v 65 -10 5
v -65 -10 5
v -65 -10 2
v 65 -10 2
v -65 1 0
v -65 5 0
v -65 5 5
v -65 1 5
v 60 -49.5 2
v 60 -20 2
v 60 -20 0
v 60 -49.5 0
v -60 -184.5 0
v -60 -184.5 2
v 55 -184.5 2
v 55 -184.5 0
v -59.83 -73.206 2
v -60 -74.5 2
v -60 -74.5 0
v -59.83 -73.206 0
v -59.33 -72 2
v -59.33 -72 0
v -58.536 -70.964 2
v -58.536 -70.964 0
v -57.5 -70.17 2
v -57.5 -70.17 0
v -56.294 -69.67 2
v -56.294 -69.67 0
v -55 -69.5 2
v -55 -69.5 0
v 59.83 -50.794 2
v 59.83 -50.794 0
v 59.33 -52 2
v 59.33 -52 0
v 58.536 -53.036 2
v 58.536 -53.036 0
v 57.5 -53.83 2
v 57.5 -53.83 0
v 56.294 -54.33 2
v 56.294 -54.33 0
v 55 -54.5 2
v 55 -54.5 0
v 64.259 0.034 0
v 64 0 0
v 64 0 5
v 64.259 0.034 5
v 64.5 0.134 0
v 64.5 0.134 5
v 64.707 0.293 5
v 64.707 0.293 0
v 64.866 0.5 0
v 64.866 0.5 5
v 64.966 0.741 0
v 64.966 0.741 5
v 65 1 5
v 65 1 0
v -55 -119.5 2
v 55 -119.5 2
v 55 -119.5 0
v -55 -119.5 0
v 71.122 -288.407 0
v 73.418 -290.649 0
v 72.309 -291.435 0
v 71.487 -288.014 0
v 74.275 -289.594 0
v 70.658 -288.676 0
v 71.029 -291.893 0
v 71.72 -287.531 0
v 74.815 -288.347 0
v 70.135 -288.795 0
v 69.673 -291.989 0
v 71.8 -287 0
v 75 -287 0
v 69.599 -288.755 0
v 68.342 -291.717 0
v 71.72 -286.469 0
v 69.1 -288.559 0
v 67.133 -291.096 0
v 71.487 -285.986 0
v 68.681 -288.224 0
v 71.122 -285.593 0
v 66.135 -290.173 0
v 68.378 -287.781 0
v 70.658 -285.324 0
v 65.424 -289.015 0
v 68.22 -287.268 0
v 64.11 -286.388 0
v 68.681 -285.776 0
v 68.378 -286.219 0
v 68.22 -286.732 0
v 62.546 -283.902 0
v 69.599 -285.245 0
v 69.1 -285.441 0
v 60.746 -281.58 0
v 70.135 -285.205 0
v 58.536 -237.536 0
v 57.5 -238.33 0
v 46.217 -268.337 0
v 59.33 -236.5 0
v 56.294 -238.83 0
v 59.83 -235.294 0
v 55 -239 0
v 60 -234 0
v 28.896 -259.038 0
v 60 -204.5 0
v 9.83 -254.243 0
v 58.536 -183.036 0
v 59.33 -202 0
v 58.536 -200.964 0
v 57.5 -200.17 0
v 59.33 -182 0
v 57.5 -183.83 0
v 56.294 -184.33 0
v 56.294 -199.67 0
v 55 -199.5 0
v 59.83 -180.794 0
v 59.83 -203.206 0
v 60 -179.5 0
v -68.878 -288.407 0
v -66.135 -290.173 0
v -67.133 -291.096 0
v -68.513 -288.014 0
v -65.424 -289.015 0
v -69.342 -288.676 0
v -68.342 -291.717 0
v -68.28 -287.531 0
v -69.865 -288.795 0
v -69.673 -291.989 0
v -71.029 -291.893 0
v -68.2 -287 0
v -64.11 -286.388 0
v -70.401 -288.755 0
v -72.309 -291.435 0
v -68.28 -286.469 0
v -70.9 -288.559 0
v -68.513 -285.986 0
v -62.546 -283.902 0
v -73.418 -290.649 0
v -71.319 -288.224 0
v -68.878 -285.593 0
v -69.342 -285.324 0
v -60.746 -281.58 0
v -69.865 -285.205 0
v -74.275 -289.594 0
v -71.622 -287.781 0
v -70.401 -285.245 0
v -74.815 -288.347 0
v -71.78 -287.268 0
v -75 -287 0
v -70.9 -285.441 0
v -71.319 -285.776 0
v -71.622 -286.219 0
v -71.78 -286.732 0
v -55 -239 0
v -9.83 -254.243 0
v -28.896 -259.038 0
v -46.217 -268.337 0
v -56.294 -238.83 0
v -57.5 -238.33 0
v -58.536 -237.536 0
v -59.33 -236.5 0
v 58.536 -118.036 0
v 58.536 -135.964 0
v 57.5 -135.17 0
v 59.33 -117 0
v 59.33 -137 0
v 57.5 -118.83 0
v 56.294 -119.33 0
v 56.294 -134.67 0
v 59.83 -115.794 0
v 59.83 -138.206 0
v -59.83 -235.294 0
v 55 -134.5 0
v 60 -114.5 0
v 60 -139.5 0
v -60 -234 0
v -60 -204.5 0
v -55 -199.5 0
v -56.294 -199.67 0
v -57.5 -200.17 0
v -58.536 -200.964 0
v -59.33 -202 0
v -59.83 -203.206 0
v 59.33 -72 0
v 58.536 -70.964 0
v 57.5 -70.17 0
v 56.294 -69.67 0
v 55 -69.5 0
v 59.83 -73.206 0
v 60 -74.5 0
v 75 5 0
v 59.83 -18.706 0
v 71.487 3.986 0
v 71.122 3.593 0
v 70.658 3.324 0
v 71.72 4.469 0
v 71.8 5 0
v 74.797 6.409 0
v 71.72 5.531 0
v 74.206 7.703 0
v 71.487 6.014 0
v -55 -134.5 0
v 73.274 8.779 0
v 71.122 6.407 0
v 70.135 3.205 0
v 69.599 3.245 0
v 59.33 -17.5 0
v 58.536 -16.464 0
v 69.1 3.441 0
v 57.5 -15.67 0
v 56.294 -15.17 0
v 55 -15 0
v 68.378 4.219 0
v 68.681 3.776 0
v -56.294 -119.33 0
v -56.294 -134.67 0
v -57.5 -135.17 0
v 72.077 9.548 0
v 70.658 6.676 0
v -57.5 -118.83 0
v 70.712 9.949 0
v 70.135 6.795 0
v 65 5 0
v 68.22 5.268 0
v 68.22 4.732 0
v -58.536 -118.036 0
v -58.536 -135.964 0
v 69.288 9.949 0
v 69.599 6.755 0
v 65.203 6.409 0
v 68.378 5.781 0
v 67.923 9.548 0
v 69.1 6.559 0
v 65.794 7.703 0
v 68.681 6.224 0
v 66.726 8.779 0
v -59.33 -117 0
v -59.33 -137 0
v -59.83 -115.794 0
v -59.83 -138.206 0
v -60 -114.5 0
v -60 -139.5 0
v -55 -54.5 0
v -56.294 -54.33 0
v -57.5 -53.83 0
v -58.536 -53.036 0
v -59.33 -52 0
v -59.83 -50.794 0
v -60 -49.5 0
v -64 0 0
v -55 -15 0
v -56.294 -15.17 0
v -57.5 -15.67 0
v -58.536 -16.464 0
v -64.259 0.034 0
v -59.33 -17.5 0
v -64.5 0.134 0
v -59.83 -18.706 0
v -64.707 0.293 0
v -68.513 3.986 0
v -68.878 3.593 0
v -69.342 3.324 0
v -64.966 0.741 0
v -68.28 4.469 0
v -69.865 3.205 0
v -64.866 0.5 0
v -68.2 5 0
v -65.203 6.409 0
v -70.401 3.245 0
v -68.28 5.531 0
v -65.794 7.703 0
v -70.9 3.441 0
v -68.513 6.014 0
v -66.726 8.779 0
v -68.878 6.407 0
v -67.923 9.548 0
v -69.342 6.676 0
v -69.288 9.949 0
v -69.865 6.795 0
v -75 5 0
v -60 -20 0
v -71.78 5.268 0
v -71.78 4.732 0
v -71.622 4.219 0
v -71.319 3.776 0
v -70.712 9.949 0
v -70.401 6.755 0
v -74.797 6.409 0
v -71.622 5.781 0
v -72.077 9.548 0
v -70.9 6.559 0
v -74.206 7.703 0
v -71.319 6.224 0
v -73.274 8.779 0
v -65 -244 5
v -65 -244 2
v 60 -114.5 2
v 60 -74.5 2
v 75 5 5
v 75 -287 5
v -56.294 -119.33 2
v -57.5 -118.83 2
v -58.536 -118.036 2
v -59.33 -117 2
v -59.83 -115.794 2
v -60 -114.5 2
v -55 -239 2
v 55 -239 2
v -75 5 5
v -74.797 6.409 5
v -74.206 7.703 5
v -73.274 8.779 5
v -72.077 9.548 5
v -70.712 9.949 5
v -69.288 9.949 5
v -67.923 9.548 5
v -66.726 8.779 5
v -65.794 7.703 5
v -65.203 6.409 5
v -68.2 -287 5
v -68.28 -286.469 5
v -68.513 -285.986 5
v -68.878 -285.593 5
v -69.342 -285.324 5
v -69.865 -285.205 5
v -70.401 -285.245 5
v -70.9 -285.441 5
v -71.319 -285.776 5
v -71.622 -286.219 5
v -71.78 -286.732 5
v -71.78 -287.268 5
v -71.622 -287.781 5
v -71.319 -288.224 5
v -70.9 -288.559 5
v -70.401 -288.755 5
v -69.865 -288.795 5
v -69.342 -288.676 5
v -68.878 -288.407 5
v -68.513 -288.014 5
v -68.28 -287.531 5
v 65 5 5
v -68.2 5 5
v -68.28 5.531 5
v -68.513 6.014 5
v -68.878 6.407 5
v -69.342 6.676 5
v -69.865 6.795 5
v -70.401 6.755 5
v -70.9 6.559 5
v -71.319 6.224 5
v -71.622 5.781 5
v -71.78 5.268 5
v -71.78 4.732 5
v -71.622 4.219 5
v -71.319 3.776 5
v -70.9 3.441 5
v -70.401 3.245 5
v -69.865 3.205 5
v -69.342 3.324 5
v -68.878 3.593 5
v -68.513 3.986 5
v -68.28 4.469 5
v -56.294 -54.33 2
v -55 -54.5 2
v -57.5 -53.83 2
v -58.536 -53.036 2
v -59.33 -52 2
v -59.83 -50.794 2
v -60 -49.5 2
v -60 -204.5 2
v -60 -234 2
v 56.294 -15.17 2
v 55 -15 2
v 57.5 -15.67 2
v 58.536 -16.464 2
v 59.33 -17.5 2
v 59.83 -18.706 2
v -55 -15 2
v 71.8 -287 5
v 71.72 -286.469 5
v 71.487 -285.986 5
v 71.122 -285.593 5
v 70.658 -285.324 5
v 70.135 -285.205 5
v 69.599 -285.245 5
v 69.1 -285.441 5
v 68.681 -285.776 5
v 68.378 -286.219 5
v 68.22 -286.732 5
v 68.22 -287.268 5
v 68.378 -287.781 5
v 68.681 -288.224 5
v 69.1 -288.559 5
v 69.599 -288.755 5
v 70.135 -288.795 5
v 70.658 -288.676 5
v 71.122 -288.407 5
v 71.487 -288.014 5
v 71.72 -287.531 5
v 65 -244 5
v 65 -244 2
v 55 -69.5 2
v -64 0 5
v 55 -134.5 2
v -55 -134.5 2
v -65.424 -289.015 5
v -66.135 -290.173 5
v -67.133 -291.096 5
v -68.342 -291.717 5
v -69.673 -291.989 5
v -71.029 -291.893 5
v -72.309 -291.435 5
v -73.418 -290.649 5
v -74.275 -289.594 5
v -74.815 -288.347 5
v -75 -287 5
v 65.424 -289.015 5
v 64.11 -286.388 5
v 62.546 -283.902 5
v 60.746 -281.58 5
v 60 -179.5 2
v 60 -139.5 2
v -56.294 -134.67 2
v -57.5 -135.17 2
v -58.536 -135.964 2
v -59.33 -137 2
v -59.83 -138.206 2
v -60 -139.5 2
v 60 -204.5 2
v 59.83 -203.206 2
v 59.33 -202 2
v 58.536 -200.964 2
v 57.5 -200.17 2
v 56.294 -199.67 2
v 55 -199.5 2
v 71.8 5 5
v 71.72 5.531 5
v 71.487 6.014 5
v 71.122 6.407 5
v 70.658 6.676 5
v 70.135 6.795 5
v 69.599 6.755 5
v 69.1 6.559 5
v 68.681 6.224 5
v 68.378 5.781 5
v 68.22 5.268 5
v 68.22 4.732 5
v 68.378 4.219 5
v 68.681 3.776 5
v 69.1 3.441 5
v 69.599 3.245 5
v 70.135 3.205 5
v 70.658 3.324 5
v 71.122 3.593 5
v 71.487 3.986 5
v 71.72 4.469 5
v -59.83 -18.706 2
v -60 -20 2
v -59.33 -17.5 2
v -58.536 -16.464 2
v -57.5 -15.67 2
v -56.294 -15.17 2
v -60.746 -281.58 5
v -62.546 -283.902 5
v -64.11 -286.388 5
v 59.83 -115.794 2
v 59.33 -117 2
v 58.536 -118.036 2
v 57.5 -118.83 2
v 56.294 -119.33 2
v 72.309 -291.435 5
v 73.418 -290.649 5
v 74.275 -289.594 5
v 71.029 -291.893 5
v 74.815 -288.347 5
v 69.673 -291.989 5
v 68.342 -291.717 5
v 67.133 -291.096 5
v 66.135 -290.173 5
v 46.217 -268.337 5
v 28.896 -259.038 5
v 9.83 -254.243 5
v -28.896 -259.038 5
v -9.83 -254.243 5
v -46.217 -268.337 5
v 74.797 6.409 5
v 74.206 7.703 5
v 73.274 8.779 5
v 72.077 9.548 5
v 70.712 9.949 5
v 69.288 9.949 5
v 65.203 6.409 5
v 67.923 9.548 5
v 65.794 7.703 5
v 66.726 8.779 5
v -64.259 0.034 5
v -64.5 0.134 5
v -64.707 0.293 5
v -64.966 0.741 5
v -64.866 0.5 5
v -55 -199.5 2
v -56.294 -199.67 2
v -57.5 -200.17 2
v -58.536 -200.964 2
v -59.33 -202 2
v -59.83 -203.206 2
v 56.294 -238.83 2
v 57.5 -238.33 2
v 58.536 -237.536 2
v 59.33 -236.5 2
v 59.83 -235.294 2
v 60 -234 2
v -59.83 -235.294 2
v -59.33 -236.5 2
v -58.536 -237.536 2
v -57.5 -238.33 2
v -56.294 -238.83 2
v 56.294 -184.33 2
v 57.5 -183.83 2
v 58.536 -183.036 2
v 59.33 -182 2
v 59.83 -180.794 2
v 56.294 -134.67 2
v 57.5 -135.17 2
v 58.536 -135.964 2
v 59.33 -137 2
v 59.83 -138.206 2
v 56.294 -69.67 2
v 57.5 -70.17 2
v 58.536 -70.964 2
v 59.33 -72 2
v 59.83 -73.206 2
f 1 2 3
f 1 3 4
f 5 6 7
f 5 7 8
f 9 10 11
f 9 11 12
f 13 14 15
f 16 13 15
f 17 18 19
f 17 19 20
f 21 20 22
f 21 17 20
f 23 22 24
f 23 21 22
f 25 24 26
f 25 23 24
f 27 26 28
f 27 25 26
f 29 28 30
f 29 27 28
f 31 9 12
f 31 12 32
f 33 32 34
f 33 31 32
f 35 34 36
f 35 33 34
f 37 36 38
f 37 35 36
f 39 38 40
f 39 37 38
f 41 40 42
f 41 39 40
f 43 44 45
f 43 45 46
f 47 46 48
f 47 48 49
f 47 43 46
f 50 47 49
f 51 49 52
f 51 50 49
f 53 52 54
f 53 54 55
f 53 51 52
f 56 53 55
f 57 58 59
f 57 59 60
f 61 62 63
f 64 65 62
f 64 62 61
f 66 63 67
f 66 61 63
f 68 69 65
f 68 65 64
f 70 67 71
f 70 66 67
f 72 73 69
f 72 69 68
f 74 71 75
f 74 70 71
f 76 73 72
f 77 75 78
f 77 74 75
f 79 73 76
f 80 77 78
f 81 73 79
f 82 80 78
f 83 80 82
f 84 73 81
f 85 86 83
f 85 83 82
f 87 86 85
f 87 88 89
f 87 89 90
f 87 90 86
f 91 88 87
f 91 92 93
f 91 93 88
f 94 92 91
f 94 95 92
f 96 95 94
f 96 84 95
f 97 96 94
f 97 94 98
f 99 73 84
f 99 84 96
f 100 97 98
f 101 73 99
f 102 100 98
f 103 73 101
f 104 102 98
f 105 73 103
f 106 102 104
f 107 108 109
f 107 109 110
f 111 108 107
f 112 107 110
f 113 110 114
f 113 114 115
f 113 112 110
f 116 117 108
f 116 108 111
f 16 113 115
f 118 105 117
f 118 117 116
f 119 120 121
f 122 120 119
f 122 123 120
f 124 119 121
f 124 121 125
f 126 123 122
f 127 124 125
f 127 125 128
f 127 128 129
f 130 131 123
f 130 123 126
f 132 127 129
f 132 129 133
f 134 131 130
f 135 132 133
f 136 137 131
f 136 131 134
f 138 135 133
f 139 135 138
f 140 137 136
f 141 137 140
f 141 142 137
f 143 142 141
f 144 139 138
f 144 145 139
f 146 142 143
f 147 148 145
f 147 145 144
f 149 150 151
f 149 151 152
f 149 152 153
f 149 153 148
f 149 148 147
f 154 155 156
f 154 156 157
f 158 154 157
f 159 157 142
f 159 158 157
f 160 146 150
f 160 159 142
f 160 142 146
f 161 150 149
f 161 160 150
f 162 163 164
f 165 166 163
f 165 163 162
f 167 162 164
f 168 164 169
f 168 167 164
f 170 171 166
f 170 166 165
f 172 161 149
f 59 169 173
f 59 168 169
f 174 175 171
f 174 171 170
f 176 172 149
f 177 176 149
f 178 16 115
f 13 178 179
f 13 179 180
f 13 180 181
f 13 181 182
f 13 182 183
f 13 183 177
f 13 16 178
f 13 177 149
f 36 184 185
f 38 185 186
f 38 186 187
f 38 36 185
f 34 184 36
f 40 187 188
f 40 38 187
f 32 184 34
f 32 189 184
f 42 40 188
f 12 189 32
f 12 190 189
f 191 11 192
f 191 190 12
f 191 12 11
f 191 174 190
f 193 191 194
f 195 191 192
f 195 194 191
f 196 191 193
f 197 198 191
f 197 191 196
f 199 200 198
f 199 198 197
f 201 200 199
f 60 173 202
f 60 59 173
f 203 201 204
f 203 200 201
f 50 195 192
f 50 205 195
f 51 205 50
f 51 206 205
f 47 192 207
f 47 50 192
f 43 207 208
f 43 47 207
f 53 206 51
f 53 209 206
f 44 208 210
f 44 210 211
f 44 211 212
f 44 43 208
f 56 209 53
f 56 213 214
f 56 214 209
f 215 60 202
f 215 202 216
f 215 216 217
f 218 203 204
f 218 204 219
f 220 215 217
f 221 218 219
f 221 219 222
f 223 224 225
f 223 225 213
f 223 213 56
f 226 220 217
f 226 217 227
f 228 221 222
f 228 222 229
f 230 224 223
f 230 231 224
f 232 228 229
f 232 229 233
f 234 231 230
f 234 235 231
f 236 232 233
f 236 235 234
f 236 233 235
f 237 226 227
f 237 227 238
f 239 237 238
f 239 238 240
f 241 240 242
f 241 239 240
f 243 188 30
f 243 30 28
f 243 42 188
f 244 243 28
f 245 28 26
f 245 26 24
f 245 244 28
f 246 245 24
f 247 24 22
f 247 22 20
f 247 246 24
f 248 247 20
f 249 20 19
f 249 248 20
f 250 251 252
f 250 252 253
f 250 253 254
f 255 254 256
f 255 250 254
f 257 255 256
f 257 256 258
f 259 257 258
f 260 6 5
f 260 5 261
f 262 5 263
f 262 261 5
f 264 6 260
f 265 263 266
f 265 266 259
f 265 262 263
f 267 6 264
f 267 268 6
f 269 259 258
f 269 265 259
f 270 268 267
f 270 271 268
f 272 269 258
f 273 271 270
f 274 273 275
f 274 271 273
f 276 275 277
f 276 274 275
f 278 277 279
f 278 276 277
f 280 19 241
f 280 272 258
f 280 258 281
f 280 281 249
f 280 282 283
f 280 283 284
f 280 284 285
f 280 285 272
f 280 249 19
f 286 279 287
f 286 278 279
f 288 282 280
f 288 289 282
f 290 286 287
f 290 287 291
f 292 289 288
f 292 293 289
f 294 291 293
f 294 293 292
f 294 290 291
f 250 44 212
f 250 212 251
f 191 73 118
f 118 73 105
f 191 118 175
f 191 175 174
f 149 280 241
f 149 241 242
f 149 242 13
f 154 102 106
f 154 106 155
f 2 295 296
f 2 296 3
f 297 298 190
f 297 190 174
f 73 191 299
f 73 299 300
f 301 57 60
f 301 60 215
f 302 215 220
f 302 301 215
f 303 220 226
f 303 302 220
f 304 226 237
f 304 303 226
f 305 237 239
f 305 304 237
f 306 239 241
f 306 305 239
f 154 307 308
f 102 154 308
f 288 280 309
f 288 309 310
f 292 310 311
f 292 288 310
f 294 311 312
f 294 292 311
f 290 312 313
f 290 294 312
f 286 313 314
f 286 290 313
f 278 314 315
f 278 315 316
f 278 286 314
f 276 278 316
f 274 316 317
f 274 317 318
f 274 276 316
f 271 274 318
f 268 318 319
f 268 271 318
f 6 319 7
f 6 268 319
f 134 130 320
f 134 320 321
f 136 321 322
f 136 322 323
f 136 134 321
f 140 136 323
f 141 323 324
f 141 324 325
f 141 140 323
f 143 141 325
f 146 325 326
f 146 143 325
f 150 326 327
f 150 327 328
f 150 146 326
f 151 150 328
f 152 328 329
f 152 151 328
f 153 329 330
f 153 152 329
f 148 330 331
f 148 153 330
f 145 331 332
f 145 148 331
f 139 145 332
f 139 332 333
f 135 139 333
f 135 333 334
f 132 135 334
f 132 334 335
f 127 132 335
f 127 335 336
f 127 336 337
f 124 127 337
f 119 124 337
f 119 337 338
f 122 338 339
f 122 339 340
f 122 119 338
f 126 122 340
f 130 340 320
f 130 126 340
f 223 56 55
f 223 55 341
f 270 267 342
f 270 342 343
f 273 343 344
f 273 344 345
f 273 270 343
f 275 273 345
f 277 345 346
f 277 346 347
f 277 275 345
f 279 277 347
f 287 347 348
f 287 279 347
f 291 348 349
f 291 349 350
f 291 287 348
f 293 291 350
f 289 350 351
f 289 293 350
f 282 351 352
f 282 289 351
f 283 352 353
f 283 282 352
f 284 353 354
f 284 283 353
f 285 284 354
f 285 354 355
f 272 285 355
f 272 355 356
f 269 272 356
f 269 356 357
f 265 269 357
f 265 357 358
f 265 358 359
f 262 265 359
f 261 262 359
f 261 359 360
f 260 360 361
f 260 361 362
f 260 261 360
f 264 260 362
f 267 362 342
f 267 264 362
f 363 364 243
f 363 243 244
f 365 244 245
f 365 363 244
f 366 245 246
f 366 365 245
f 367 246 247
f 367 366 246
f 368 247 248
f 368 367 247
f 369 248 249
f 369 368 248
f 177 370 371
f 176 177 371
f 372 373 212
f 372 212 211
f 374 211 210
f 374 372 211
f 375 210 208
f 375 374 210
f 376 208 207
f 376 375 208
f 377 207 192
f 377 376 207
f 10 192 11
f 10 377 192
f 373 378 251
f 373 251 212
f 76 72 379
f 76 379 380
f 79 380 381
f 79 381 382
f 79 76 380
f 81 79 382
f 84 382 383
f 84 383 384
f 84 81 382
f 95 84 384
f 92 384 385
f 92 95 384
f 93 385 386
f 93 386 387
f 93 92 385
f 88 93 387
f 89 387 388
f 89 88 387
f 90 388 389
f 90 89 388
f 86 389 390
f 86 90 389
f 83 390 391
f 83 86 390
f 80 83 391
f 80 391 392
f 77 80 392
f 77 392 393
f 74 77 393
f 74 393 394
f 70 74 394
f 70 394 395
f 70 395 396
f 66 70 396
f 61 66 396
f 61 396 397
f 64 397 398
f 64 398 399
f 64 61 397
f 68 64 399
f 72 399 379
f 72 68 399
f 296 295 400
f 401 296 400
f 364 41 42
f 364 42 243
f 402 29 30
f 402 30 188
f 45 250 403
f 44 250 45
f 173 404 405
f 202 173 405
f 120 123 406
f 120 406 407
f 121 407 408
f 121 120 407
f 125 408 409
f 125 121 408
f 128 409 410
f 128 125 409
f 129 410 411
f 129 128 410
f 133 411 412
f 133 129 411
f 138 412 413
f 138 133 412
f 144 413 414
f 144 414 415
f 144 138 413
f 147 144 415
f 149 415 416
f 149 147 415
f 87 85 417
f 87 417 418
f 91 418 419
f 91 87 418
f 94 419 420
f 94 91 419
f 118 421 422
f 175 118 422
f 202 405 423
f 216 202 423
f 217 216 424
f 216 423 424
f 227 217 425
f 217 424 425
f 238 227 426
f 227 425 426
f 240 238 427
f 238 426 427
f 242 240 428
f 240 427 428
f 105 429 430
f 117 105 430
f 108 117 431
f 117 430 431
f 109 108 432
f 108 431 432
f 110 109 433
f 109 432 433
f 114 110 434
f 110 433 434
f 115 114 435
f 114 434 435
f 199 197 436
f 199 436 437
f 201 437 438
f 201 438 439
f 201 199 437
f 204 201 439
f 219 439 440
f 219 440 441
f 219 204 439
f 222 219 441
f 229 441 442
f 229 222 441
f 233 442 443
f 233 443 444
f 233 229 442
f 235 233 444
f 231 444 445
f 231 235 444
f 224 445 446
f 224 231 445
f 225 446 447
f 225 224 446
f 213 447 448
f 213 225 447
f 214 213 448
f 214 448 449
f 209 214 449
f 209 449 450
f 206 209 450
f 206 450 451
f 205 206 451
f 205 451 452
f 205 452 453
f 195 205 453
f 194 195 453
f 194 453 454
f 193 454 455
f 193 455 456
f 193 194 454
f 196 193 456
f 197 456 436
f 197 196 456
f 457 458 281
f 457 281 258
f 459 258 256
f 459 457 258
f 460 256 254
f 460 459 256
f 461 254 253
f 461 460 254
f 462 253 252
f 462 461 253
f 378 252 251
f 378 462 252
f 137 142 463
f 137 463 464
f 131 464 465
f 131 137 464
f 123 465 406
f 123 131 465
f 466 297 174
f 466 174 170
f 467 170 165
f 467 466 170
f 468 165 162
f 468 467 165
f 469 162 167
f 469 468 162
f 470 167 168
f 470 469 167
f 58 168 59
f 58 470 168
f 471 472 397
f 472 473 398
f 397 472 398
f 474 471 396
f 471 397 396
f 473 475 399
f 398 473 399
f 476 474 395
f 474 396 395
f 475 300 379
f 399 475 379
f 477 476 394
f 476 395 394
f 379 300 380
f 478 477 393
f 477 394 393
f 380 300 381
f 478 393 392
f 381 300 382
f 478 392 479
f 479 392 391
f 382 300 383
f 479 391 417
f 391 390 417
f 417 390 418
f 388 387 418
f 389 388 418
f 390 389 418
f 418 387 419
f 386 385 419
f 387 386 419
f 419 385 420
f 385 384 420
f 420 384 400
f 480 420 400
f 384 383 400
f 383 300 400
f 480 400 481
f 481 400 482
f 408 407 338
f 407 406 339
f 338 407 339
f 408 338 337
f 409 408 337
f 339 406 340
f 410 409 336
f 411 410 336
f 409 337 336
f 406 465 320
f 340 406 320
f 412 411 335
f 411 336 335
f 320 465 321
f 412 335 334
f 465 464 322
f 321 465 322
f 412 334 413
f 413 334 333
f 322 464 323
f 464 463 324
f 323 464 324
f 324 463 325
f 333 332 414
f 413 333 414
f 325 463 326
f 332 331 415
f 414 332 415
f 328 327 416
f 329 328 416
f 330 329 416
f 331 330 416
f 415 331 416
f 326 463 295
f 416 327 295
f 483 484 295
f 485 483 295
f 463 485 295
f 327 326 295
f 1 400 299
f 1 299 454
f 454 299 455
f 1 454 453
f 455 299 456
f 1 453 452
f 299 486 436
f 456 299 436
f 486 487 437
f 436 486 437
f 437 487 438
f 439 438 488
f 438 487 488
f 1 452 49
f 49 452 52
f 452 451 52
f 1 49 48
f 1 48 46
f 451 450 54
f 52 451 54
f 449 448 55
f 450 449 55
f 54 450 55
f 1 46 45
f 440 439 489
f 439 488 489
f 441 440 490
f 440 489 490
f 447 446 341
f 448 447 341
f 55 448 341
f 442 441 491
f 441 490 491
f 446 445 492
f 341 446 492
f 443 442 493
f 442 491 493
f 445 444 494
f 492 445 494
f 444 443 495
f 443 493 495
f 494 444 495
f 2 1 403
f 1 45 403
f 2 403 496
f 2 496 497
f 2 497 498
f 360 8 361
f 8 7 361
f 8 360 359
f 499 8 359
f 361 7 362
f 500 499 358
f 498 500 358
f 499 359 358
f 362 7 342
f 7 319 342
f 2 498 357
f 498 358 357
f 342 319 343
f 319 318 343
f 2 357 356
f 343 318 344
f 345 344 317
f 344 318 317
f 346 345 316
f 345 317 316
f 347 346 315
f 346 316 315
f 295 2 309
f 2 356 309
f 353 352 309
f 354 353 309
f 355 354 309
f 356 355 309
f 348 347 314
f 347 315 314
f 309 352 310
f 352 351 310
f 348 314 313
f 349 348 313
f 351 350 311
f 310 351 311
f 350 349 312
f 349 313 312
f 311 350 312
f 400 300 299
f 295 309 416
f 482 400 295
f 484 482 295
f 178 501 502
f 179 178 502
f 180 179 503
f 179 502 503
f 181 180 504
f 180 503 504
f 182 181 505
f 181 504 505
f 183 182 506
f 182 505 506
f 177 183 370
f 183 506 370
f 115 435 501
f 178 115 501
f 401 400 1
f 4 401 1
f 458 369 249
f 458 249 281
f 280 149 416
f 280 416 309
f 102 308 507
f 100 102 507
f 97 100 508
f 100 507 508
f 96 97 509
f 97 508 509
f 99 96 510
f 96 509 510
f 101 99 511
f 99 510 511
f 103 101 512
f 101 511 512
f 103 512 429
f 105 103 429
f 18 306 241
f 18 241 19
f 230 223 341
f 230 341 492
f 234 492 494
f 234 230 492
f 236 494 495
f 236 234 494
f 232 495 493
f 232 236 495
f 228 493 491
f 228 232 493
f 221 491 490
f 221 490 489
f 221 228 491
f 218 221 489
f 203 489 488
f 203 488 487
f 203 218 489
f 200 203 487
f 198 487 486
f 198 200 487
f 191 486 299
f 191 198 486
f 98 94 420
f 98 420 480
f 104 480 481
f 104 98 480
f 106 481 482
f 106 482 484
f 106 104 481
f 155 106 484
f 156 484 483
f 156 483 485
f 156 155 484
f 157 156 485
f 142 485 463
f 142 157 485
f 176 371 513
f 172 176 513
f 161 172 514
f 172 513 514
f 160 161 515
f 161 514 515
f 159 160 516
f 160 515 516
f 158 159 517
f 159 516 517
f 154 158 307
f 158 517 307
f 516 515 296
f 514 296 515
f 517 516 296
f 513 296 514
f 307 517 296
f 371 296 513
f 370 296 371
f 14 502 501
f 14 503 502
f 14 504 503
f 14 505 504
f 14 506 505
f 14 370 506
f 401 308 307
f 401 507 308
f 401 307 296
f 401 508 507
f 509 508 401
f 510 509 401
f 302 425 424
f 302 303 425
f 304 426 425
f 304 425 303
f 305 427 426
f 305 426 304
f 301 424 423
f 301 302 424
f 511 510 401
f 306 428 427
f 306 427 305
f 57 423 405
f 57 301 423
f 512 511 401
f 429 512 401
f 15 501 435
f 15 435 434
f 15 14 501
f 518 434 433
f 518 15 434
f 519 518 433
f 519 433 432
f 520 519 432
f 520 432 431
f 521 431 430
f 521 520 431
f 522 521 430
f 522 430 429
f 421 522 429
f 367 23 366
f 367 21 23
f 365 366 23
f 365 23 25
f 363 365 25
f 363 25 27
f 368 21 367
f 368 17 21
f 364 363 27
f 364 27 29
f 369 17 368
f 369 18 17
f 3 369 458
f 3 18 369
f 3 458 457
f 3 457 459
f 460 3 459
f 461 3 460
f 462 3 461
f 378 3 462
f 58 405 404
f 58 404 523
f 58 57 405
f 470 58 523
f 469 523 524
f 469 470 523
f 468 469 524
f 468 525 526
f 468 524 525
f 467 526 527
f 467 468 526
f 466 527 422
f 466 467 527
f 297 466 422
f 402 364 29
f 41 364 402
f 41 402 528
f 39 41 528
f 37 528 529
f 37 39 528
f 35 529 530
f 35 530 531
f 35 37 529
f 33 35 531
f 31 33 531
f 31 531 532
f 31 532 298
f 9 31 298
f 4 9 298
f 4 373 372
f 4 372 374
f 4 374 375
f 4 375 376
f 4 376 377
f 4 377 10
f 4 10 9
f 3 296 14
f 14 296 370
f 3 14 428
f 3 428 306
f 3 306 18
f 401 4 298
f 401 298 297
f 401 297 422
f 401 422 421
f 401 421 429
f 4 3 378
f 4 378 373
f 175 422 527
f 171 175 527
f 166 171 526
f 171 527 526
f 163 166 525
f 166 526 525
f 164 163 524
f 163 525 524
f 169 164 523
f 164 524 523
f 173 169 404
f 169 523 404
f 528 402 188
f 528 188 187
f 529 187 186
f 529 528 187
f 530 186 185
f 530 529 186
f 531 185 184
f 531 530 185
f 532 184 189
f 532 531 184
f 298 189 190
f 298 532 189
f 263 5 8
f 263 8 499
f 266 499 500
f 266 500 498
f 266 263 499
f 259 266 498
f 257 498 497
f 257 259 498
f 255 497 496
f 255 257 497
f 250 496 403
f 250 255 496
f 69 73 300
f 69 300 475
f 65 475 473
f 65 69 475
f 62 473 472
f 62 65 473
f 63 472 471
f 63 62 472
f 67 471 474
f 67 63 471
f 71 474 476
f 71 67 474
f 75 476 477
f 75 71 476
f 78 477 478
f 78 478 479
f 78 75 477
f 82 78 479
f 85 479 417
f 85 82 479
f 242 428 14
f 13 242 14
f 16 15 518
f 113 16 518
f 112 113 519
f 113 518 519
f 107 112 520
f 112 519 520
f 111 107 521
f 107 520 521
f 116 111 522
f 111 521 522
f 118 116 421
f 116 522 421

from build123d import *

# Parameters (mm, degrees)
SKETCH_2_R          = 1.8
EXTRUDE_1_DEPTH     = 5
SKETCH_3_W          = 130
SKETCH_3_H          = 234
CUT_EXTRUDE_1_DEPTH = 3
CUT_EXTRUDE_2_DEPTH = 302.492951825


with BuildPart() as part:
    # Эскиз2 → Бобышка-Вытянуть1 (new body)
    with BuildSketch(Plane.XY):
        with BuildLine():
            Line((-65, 5), (-65, 1))
            ThreePointArc((-65, 1), (-64.707106781, 0.292893219), (-64, 0))
            Line((-64, 0), (64, 0))
            ThreePointArc((64, 0), (64.707106781, 0.292893219), (65, 1))
            Line((65, 1), (65, 5))
            ThreePointArc((65, 5), (70, 10), (75, 5))
            Line((75, 5), (75, -287))
            ThreePointArc((75, -287), (71.029305531, -291.892906102), (65.42378795, -289.014518125))
            ThreePointArc((65.42378795, -289.014518125), (63.358638237, -285.125391065), (60.746425043, -281.58046584))
            ThreePointArc((60.746425043, -281.58046584), (0, -253.636895265), (-60.746425043, -281.58046584))
            ThreePointArc((-60.746425043, -281.58046584), (-63.358638237, -285.125391065), (-65.42378795, -289.014518125))
            ThreePointArc((-65.42378795, -289.014518125), (-71.029305531, -291.892906102), (-75, -287))
            Line((-75, -287), (-75, 5))
            ThreePointArc((-75, 5), (-70, 10), (-65, 5))
        make_face()
        with Locations((70, -287)):
            Circle(SKETCH_2_R, mode=Mode.SUBTRACT)
        with Locations((-70, -287)):
            Circle(SKETCH_2_R, mode=Mode.SUBTRACT)
        with Locations((-70, 5)):
            Circle(SKETCH_2_R, mode=Mode.SUBTRACT)
        with Locations((70, 5)):
            Circle(SKETCH_2_R, mode=Mode.SUBTRACT)
    extrude(amount=EXTRUDE_1_DEPTH)

    # Эскиз3 → Вырез-Вытянуть1 (cut)
    with BuildSketch(Plane.XY.offset(5)):
        with Locations((0, -127)):
            Rectangle(SKETCH_3_W, SKETCH_3_H)
    extrude(amount=-CUT_EXTRUDE_1_DEPTH, mode=Mode.SUBTRACT)

    # Эскиз4 → Вырез-Вытянуть2 (cut, through all)
    with BuildSketch(Plane.XY.offset(2)):
        with BuildLine():
            Line((-55, -15), (55, -15))
            ThreePointArc((55, -15), (58.535533906, -16.464466094), (60, -20))
            Line((60, -20), (60, -49.5))
            ThreePointArc((60, -49.5), (58.535533906, -53.035533906), (55, -54.5))
            Line((55, -54.5), (-55, -54.5))
            ThreePointArc((-55, -54.5), (-58.535533906, -53.035533906), (-60, -49.5))
            Line((-60, -49.5), (-60, -20))
            ThreePointArc((-60, -20), (-58.535533906, -16.464466094), (-55, -15))
        make_face()
        with BuildLine():
            Line((-55, -239), (55, -239))
            ThreePointArc((55, -239), (58.535533906, -237.535533906), (60, -234))
            Line((60, -234), (60, -204.5))
            ThreePointArc((60, -204.5), (58.535533906, -200.964466094), (55, -199.5))
            Line((55, -199.5), (-55, -199.5))
            ThreePointArc((-55, -199.5), (-58.535533906, -200.964466094), (-60, -204.5))
            Line((-60, -204.5), (-60, -234))
            ThreePointArc((-60, -234), (-58.535533906, -237.535533906), (-55, -239))
        make_face()
        with BuildLine():
            Line((55, -119.5), (-55, -119.5))
            ThreePointArc((-55, -119.5), (-58.535533906, -118.035533906), (-60, -114.5))
            Line((-60, -114.5), (-60, -74.5))
            ThreePointArc((-60, -74.5), (-58.535533906, -70.964466094), (-55, -69.5))
            Line((-55, -69.5), (55, -69.5))
            ThreePointArc((55, -69.5), (58.535533906, -70.964466094), (60, -74.5))
            Line((60, -74.5), (60, -114.5))
            ThreePointArc((60, -114.5), (58.535533906, -118.035533906), (55, -119.5))
        make_face()
        with BuildLine():
            Line((-60, -139.5), (-60, -184.5))
            Line((-60, -184.5), (55, -184.5))
            ThreePointArc((55, -184.5), (58.535533906, -183.035533906), (60, -179.5))
            Line((60, -179.5), (60, -139.5))
            ThreePointArc((60, -139.5), (58.535533906, -135.964466094), (55, -134.5))
            Line((55, -134.5), (-55, -134.5))
            ThreePointArc((-55, -134.5), (-58.535533906, -135.964466094), (-60, -139.5))
        make_face()
    extrude(amount=-CUT_EXTRUDE_2_DEPTH, mode=Mode.SUBTRACT)


solid = part.part
